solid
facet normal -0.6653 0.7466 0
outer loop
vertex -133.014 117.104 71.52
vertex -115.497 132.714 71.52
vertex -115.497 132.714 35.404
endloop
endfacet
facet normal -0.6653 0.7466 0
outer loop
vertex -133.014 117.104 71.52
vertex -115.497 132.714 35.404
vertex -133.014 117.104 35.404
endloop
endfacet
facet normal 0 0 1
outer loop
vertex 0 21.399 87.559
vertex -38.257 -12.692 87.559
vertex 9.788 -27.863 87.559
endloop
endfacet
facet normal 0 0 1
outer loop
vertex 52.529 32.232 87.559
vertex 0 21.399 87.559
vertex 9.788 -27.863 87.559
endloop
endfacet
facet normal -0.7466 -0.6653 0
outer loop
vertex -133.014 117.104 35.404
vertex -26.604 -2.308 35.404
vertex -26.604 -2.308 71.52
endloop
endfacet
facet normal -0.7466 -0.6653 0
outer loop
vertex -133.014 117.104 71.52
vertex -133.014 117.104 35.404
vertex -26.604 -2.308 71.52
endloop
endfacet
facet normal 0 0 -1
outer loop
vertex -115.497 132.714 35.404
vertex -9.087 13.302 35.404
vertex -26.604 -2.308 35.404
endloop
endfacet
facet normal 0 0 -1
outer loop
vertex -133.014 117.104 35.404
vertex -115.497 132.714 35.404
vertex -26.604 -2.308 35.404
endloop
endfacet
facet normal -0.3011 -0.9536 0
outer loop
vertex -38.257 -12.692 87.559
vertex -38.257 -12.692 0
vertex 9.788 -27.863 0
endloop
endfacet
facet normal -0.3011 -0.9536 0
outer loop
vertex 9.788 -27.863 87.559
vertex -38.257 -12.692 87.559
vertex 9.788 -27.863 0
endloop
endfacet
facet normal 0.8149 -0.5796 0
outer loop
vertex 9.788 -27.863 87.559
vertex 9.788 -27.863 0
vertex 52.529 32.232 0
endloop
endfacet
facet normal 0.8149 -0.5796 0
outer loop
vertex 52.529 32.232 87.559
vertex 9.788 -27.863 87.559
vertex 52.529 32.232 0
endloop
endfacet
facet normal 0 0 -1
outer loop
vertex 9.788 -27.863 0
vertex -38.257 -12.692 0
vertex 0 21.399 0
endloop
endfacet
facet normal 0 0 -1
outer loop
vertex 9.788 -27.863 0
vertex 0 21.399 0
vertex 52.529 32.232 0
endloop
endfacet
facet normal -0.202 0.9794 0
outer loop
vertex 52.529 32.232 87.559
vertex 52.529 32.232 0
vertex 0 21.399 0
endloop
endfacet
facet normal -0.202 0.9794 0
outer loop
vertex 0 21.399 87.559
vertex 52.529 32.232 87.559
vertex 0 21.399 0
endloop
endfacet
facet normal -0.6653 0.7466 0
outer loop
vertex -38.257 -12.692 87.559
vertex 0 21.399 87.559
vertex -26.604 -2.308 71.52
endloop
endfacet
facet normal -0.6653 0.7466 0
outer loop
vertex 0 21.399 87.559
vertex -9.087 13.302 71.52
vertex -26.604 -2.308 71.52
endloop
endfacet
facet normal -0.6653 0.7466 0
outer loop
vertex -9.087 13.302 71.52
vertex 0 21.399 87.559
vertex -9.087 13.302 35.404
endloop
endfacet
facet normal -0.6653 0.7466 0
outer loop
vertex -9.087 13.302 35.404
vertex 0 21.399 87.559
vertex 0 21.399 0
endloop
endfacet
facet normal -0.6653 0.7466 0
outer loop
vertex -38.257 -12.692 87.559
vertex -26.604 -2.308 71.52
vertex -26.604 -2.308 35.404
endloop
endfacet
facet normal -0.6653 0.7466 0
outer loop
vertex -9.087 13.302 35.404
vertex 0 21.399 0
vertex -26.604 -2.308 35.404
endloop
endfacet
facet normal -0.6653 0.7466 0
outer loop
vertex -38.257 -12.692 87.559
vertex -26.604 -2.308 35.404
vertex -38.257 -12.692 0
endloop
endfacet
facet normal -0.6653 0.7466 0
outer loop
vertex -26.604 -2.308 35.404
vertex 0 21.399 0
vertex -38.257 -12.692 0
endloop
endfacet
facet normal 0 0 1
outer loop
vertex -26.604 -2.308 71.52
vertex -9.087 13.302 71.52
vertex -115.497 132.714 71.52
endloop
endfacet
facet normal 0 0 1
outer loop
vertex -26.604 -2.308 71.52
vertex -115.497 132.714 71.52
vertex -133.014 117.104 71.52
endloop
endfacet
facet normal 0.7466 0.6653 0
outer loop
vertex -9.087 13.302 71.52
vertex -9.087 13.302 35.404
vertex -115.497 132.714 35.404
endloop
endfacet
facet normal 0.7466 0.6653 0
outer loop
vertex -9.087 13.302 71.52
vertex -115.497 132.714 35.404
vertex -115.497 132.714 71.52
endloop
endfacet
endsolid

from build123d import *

# Parameters (mm, degrees)
F1_DEPTH = 87.558992
F2_W     = 23.463726
F2_H     = 36.116287
F3_DEPTH = 159.944564


with BuildPart() as f1:
    # F0 (on Top) → F1 (new body)
    with BuildSketch(Plane.XY):
        Polygon((52.528806, 32.23221), (0, 21.399237), (-38.256936, -12.692079), (9.787939, -27.863212), align=None)
    extrude(amount=F1_DEPTH)

    # F2 (on face) → F3 (join)
    with BuildSketch(Plane(origin=(-10.628911, 11.927659, 0), x_dir=(-0.746584, -0.665292, 0), z_dir=(-0.665292, 0.746584, 0))):
        with Locations((9.666294, 53.462007)):
            Rectangle(F2_W, F2_H)
    extrude(amount=F3_DEPTH)


solid = f1.part
